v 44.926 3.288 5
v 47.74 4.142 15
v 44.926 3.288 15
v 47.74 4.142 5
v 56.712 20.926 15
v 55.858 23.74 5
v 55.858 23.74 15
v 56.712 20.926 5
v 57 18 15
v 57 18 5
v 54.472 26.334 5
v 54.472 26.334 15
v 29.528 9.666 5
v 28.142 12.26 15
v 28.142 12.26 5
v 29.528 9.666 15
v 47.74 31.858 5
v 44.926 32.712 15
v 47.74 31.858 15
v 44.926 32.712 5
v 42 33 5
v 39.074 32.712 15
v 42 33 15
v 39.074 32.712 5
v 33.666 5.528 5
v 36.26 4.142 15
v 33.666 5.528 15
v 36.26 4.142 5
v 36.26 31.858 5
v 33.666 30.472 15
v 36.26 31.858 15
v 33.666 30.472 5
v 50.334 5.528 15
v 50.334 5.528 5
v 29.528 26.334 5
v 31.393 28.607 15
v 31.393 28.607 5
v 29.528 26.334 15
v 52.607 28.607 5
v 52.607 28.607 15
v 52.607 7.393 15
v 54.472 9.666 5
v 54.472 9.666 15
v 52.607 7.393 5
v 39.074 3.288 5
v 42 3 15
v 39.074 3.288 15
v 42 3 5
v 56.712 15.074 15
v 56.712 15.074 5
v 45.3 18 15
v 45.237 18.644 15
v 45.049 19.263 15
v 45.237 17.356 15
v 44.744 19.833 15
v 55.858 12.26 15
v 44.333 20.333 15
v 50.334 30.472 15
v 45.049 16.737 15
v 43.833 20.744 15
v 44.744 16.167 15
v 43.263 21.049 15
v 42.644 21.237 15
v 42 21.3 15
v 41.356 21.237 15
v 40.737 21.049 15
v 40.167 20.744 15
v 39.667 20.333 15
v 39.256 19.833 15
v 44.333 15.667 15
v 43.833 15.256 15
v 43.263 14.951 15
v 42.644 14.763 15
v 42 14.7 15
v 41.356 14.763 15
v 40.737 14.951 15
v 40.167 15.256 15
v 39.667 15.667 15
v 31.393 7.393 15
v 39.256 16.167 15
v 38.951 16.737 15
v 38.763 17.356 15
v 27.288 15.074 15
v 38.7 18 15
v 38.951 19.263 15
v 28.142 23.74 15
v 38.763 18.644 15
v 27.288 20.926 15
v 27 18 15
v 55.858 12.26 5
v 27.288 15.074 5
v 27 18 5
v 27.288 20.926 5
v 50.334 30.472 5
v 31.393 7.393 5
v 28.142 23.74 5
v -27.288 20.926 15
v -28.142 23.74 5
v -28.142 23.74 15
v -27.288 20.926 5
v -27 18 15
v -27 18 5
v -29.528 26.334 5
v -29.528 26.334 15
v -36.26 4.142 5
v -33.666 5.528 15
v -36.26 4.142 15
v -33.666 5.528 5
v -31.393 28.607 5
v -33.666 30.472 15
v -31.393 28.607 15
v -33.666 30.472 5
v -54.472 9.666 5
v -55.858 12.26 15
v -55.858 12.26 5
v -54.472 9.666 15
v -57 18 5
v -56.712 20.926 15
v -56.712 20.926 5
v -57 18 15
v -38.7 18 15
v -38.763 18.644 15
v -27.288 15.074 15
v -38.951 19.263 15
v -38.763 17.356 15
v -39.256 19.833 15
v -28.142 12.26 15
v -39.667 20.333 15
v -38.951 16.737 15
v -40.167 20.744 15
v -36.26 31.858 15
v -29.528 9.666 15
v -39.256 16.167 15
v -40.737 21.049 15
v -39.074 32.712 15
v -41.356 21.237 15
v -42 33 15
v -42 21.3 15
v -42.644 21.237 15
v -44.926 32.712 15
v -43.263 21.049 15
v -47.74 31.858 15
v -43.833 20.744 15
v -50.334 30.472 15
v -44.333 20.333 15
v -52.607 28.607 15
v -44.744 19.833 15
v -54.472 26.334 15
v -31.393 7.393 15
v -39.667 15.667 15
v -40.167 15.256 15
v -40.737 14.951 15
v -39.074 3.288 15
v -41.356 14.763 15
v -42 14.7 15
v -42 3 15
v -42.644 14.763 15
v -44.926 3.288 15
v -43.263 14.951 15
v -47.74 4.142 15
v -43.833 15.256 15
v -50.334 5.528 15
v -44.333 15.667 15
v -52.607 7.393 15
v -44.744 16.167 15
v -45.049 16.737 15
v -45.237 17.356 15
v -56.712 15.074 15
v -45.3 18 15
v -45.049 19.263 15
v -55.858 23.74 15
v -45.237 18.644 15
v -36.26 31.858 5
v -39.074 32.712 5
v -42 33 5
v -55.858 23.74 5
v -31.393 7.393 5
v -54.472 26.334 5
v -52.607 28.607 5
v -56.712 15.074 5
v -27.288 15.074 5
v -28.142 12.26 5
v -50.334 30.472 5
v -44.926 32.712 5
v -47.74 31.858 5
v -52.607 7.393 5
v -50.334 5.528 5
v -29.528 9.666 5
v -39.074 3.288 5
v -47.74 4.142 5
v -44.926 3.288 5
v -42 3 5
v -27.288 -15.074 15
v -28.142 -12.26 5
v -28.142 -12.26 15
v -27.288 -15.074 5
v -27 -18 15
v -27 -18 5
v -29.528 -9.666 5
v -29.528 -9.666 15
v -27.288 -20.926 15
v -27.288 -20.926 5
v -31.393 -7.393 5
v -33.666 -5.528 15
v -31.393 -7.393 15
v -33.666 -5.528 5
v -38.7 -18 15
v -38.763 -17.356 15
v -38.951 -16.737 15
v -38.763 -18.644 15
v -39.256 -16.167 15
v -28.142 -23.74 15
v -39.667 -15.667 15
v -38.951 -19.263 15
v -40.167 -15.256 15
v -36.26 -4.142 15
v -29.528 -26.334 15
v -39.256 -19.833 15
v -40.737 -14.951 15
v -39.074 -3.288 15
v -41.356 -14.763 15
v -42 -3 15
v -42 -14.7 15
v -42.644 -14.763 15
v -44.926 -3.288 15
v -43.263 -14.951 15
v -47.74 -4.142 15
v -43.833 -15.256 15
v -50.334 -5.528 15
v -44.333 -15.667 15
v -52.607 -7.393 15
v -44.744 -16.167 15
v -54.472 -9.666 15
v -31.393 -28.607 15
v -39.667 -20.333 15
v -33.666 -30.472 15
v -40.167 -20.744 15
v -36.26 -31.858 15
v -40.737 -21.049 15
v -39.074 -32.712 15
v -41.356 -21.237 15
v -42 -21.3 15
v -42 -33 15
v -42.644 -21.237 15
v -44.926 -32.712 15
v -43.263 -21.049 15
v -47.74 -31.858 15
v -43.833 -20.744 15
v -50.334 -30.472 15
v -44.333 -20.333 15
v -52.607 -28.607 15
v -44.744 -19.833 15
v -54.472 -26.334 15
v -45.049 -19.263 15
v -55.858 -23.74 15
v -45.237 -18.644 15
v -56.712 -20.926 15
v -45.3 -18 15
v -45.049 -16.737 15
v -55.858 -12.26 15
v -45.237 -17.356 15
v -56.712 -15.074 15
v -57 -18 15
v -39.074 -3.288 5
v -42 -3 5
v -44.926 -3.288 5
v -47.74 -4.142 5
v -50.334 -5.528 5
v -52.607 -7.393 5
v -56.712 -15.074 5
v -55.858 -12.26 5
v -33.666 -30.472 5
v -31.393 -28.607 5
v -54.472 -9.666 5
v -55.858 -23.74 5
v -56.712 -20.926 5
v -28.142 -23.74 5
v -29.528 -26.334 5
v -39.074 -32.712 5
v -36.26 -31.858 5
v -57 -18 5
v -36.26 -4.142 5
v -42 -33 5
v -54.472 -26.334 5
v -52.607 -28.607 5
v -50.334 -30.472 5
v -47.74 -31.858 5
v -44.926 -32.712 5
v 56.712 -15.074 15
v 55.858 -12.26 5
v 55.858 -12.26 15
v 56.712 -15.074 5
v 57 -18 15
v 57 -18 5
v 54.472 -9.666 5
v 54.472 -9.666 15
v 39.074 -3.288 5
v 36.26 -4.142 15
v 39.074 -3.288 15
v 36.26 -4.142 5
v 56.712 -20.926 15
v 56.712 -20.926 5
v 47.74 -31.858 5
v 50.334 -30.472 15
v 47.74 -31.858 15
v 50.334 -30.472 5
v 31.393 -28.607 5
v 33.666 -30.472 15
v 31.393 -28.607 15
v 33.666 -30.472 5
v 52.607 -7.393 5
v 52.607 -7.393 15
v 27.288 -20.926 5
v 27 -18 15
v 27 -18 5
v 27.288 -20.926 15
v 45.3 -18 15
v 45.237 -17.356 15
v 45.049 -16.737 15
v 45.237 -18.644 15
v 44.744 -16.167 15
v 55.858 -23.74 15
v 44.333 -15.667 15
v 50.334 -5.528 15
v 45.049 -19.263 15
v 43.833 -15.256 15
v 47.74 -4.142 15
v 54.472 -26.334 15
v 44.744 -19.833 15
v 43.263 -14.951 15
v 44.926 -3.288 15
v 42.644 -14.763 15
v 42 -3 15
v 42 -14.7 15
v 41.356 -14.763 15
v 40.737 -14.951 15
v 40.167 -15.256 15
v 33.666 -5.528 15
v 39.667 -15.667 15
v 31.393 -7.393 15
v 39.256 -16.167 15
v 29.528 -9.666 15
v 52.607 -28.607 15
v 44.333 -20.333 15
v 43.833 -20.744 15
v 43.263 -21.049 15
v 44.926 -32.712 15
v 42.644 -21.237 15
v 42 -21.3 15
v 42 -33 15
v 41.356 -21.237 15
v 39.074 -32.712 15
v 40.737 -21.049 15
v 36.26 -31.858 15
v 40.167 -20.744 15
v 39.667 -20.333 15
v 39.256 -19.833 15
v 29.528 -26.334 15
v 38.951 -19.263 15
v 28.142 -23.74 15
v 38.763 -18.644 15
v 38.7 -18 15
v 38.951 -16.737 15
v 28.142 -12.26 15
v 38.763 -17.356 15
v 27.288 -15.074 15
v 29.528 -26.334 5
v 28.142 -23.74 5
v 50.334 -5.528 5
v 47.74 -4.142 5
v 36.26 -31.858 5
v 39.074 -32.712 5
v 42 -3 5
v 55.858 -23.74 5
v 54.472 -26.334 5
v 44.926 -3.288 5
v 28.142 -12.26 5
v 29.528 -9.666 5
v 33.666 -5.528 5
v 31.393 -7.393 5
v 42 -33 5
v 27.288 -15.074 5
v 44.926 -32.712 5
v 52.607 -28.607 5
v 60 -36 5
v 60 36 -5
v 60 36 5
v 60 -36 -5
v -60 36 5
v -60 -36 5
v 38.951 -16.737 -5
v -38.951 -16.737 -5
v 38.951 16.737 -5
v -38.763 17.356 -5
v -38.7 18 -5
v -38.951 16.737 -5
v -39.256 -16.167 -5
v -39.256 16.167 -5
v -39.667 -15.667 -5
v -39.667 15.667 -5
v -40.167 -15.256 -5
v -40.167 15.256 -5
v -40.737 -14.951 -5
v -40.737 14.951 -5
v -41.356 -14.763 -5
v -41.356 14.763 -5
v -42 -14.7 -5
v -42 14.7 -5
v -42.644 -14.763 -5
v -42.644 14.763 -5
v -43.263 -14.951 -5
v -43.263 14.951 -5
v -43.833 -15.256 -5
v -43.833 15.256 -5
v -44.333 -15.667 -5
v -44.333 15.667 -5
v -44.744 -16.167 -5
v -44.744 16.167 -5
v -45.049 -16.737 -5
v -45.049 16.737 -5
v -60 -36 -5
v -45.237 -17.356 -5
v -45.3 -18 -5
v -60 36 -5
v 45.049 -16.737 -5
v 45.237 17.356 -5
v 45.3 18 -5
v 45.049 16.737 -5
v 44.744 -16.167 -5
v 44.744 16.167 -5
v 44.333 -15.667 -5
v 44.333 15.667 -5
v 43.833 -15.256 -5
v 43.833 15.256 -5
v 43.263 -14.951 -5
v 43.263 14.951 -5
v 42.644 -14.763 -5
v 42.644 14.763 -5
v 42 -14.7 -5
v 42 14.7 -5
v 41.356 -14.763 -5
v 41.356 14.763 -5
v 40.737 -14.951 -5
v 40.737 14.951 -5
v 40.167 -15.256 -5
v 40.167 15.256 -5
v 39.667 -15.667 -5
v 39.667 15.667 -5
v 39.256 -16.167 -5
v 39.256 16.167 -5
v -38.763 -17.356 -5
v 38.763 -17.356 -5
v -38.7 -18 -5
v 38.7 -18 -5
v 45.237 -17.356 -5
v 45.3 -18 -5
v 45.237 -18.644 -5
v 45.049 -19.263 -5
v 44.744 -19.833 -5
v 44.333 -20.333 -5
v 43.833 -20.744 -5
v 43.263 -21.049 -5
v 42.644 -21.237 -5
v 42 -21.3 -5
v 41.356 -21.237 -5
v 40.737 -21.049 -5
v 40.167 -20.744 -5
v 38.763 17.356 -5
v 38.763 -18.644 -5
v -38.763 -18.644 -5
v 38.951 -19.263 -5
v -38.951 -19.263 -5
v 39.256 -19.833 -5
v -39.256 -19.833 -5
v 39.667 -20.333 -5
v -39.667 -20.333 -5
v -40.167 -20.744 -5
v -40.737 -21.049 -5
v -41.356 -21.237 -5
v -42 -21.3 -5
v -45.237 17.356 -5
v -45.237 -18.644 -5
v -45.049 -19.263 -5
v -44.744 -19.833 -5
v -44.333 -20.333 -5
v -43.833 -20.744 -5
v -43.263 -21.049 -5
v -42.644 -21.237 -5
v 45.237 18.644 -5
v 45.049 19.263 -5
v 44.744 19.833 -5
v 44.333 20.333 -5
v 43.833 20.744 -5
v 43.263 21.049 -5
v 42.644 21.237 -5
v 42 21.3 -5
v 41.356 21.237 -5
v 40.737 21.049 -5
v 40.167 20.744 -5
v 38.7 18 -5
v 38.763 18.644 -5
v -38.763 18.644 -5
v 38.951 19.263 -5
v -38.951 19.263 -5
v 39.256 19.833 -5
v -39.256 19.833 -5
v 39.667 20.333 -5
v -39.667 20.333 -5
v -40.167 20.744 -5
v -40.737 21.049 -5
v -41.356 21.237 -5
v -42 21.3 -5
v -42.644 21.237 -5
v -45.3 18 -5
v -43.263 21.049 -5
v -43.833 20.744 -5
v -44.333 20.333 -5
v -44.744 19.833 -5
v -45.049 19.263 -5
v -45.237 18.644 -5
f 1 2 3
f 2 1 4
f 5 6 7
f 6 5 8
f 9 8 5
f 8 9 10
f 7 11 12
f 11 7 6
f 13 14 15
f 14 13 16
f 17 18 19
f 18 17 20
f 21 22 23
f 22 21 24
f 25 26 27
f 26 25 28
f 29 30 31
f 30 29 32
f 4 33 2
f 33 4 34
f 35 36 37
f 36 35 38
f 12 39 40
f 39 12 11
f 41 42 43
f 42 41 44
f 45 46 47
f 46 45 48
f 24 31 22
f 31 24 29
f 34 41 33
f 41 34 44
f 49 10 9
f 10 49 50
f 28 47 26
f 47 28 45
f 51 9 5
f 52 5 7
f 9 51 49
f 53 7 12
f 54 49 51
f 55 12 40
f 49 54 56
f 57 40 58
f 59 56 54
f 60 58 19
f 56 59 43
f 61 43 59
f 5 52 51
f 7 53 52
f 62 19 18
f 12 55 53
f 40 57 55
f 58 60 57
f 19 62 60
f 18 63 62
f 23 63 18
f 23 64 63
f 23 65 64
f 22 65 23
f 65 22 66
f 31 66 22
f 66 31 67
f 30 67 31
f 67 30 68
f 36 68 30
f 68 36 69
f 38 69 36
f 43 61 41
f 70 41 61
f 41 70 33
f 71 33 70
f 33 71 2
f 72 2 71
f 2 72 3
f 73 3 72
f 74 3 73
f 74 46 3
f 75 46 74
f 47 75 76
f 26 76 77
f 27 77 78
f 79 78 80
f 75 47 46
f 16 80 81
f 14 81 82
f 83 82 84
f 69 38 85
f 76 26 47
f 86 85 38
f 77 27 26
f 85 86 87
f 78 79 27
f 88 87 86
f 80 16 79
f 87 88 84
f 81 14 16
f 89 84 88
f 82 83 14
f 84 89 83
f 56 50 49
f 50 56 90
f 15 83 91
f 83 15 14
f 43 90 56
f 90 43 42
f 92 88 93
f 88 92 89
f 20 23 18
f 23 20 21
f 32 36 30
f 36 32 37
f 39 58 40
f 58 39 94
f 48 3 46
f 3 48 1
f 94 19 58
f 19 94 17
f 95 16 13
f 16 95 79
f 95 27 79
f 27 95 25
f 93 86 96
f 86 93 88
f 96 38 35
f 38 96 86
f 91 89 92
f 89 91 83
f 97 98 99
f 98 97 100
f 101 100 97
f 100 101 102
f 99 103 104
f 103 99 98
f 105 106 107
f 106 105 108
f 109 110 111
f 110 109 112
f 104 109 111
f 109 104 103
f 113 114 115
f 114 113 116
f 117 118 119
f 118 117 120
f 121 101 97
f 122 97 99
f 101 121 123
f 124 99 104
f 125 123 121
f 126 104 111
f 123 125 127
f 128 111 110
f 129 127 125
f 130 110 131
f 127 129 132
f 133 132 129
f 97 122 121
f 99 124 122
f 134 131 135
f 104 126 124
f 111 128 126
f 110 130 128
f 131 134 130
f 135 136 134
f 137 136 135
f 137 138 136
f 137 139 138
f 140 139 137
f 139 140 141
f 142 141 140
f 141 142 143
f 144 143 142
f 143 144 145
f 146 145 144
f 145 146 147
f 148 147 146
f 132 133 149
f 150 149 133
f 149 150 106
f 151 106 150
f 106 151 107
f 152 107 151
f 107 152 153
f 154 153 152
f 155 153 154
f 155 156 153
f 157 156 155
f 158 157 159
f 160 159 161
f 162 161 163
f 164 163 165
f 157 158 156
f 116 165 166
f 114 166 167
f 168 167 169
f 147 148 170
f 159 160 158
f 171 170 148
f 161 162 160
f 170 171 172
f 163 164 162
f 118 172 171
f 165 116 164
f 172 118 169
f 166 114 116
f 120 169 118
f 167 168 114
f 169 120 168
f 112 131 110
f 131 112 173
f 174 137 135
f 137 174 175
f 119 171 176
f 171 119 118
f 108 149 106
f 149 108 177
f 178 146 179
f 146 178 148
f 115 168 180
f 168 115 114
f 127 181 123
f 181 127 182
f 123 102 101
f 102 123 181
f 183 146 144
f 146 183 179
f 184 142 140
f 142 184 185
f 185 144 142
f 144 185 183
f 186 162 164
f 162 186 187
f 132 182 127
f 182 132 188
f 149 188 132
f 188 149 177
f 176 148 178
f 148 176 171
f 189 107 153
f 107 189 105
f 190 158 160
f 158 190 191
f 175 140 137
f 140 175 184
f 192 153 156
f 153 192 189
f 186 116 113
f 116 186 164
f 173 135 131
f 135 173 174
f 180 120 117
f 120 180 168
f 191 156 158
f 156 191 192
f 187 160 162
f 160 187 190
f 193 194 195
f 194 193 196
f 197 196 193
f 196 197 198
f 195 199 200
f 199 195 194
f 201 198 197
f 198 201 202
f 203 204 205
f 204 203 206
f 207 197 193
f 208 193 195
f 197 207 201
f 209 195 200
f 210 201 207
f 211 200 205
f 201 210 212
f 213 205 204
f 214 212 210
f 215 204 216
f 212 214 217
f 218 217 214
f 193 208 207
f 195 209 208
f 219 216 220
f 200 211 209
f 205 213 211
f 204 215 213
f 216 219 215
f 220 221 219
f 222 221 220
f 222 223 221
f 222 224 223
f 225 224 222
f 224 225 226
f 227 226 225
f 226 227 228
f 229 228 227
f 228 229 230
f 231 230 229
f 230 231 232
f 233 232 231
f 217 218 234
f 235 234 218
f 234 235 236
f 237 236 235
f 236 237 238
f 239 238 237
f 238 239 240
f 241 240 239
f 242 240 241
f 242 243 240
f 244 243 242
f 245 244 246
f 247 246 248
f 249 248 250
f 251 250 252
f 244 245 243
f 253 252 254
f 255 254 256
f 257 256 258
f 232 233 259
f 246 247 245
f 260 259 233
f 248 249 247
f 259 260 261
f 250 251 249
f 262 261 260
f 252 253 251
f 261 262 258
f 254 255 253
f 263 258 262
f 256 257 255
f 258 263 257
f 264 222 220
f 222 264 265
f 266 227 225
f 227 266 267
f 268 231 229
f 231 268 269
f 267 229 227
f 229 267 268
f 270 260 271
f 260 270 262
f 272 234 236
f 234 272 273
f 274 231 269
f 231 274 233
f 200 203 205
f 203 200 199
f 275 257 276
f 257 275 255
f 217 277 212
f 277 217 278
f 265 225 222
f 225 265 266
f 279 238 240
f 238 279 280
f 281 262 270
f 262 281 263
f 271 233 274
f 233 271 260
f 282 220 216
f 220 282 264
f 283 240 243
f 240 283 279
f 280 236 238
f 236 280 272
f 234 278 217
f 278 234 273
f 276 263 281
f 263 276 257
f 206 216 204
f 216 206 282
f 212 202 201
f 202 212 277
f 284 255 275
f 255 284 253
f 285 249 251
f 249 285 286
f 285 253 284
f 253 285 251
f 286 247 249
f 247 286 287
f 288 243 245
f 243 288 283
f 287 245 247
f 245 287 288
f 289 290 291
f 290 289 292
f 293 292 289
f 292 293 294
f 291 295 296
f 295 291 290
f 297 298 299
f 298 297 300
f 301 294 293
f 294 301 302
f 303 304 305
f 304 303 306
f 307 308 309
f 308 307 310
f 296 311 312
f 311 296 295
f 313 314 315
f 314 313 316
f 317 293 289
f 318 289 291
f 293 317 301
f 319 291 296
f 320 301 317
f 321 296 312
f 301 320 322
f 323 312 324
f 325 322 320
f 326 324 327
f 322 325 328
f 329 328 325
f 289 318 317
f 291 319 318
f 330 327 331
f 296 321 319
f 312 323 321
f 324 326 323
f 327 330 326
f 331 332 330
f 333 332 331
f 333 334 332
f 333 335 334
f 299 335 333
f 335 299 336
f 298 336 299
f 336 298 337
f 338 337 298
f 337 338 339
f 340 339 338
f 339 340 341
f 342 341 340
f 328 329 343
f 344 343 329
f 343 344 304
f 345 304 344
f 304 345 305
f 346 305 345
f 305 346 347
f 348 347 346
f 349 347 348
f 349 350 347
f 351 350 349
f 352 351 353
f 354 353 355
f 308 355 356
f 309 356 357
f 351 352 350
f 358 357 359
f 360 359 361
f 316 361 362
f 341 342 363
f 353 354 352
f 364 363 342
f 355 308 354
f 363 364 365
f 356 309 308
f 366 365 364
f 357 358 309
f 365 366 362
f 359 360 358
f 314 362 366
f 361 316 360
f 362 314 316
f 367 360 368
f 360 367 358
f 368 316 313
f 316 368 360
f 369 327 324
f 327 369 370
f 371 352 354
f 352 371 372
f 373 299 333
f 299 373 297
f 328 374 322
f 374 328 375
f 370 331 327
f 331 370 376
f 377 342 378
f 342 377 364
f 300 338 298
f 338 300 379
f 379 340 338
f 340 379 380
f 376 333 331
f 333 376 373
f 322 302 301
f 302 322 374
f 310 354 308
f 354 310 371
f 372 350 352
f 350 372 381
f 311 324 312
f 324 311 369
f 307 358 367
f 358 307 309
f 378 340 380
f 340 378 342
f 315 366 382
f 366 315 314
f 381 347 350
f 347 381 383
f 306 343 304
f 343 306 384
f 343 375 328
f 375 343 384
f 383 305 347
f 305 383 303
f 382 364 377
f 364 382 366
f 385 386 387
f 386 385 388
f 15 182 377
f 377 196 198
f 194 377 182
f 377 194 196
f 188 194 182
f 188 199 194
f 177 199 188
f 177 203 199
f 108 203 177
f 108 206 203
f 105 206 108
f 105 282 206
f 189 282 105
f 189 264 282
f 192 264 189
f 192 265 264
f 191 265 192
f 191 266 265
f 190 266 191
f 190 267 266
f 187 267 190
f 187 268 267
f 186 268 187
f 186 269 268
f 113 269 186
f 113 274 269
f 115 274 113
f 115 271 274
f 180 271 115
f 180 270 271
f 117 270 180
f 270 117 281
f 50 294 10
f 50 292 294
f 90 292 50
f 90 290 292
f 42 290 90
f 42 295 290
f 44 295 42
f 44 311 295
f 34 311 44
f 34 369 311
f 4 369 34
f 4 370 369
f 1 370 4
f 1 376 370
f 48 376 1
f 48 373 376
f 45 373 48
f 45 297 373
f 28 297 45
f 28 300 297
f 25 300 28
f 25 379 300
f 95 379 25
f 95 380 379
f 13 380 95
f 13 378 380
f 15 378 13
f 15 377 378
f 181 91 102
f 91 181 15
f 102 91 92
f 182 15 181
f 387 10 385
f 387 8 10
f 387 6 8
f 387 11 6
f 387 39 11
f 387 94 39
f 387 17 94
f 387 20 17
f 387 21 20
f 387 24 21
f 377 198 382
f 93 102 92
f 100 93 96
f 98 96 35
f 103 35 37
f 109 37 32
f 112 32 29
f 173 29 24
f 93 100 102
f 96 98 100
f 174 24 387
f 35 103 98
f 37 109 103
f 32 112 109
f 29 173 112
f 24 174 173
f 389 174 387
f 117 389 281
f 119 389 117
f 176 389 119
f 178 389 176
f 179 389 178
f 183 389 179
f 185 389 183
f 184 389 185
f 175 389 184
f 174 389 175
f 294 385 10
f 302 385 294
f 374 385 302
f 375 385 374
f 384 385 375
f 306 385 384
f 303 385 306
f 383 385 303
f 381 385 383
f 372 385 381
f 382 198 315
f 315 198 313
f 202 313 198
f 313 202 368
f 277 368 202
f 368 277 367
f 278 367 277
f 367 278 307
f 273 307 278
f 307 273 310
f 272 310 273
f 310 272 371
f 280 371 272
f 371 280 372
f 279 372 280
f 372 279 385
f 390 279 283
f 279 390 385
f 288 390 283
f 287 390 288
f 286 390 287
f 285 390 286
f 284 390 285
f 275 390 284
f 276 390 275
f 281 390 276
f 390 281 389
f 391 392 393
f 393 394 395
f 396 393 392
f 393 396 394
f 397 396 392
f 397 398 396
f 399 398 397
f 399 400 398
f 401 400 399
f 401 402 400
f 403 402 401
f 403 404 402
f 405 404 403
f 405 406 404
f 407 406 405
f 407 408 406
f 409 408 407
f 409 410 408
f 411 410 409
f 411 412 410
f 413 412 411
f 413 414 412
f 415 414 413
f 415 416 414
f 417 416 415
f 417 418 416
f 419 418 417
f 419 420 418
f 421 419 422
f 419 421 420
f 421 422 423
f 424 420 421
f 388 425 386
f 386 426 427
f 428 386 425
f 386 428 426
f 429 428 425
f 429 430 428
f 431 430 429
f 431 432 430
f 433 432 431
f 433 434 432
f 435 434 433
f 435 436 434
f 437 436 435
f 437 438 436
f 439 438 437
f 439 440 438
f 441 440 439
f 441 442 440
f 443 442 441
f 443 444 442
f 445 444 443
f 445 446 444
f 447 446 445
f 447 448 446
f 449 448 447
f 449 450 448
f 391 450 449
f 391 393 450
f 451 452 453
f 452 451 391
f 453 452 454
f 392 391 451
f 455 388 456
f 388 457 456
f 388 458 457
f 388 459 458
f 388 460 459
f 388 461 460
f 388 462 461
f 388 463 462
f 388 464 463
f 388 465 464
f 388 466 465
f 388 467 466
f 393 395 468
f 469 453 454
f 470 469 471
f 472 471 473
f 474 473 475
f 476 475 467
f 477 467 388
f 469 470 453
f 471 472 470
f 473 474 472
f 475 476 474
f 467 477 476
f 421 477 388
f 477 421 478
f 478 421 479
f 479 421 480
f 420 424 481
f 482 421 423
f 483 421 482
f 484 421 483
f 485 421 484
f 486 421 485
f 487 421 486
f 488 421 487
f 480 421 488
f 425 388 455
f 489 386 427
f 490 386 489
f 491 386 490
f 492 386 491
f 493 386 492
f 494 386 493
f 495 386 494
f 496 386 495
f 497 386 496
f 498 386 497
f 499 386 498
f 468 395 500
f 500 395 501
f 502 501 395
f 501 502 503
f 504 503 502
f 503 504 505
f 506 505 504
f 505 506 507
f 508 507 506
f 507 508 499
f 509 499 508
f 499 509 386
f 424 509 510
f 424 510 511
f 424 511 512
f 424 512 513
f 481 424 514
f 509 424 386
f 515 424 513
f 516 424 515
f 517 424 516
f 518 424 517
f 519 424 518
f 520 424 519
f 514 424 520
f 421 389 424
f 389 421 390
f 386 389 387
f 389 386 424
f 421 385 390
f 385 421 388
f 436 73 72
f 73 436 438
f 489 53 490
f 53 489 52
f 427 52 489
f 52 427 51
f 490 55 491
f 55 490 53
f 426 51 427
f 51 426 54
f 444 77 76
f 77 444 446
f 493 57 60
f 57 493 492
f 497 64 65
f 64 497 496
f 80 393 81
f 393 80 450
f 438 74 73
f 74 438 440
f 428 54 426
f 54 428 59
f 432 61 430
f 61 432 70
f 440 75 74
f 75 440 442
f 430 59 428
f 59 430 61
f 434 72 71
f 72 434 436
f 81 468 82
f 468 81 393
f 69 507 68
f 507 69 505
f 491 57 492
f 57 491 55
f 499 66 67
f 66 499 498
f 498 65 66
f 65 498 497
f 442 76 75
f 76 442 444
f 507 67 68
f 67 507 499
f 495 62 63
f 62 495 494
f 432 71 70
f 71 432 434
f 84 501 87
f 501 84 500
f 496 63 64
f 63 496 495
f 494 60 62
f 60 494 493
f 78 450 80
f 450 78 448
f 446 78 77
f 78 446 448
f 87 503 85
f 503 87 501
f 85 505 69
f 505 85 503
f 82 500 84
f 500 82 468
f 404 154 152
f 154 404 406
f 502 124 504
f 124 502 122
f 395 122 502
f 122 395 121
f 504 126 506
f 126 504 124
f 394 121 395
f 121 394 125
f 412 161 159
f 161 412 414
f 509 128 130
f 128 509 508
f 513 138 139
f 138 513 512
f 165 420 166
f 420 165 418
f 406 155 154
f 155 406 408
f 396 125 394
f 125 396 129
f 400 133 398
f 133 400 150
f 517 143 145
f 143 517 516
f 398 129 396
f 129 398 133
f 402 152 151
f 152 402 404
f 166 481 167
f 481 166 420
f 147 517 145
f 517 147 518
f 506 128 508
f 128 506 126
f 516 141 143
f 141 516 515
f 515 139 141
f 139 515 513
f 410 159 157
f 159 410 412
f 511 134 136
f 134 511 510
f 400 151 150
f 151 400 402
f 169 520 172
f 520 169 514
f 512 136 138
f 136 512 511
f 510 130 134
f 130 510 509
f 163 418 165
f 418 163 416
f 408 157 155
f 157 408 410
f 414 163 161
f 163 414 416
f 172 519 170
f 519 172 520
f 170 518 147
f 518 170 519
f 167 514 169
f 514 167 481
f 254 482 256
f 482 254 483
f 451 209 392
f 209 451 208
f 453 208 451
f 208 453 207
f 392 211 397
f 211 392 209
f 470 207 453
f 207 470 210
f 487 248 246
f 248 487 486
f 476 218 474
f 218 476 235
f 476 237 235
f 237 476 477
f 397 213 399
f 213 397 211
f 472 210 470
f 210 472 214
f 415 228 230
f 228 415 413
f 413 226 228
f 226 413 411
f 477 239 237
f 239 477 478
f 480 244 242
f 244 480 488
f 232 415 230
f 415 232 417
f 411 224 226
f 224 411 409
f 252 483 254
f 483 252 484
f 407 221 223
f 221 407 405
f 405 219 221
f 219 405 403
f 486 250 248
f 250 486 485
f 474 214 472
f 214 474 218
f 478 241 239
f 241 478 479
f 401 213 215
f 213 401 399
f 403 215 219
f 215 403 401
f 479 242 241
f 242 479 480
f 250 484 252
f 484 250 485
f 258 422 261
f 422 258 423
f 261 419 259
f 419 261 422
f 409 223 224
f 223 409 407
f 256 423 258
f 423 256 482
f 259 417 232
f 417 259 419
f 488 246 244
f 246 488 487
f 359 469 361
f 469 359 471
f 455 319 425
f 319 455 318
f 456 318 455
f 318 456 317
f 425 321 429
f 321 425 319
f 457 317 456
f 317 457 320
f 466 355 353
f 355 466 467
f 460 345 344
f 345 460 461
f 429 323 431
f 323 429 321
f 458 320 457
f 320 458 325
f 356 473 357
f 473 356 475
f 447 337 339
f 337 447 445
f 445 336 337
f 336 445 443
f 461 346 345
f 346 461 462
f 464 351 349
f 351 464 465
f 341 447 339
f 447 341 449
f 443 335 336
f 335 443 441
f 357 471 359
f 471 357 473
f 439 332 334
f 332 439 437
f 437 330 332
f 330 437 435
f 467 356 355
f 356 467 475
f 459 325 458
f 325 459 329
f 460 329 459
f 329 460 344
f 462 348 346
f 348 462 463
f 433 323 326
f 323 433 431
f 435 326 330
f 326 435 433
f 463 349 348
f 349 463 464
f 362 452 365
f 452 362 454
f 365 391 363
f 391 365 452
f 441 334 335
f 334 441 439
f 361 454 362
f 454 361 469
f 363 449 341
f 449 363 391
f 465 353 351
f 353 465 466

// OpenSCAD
$fn = 32;

// ----------------------------------------------------------------------
// Anchor pads 120 x 72 x 20
// four corner bosses with anchor holes
// ----------------------------------------------------------------------

// --- parameters (mm) ---
plate = [120, 72, 10];  // base plate size (x, y, z)
pads = 4;               // boss count, one per corner
edge = 18;              // boss centre offset from the plate edge
boss_d = 30;            // boss diameter
boss_h = 10;            // boss height above the base plate
hole_d = 6.6;           // hole diameter

// --- derived feature positions (mm) ---
height = plate[2] + boss_h;      // = 20   overall height of the part
corner_x = plate[0] / 2 - edge;  // = 42   boss centre X
corner_y = plate[1] / 2 - edge;  // = 18   boss centre Y
feature_centers = [
  [corner_x, corner_y],
  [-corner_x, corner_y],
  [-corner_x, -corner_y],
  [corner_x, -corner_y]
];   // boss centres, anchor holes are drilled there

// base plate, four bosses standing on it, anchor holes all the way through
difference() {
  union() {
    cube(plate, center = true);
    for (centre = feature_centers)
      translate([centre[0], centre[1], plate[2] / 2 - 1])
        cylinder(d = boss_d, h = boss_h + 1);
  }
  for (centre = feature_centers)
    translate([centre[0], centre[1], -height])
      cylinder(d = hole_d, h = 2 * height + 2);  // through boss and plate
}
